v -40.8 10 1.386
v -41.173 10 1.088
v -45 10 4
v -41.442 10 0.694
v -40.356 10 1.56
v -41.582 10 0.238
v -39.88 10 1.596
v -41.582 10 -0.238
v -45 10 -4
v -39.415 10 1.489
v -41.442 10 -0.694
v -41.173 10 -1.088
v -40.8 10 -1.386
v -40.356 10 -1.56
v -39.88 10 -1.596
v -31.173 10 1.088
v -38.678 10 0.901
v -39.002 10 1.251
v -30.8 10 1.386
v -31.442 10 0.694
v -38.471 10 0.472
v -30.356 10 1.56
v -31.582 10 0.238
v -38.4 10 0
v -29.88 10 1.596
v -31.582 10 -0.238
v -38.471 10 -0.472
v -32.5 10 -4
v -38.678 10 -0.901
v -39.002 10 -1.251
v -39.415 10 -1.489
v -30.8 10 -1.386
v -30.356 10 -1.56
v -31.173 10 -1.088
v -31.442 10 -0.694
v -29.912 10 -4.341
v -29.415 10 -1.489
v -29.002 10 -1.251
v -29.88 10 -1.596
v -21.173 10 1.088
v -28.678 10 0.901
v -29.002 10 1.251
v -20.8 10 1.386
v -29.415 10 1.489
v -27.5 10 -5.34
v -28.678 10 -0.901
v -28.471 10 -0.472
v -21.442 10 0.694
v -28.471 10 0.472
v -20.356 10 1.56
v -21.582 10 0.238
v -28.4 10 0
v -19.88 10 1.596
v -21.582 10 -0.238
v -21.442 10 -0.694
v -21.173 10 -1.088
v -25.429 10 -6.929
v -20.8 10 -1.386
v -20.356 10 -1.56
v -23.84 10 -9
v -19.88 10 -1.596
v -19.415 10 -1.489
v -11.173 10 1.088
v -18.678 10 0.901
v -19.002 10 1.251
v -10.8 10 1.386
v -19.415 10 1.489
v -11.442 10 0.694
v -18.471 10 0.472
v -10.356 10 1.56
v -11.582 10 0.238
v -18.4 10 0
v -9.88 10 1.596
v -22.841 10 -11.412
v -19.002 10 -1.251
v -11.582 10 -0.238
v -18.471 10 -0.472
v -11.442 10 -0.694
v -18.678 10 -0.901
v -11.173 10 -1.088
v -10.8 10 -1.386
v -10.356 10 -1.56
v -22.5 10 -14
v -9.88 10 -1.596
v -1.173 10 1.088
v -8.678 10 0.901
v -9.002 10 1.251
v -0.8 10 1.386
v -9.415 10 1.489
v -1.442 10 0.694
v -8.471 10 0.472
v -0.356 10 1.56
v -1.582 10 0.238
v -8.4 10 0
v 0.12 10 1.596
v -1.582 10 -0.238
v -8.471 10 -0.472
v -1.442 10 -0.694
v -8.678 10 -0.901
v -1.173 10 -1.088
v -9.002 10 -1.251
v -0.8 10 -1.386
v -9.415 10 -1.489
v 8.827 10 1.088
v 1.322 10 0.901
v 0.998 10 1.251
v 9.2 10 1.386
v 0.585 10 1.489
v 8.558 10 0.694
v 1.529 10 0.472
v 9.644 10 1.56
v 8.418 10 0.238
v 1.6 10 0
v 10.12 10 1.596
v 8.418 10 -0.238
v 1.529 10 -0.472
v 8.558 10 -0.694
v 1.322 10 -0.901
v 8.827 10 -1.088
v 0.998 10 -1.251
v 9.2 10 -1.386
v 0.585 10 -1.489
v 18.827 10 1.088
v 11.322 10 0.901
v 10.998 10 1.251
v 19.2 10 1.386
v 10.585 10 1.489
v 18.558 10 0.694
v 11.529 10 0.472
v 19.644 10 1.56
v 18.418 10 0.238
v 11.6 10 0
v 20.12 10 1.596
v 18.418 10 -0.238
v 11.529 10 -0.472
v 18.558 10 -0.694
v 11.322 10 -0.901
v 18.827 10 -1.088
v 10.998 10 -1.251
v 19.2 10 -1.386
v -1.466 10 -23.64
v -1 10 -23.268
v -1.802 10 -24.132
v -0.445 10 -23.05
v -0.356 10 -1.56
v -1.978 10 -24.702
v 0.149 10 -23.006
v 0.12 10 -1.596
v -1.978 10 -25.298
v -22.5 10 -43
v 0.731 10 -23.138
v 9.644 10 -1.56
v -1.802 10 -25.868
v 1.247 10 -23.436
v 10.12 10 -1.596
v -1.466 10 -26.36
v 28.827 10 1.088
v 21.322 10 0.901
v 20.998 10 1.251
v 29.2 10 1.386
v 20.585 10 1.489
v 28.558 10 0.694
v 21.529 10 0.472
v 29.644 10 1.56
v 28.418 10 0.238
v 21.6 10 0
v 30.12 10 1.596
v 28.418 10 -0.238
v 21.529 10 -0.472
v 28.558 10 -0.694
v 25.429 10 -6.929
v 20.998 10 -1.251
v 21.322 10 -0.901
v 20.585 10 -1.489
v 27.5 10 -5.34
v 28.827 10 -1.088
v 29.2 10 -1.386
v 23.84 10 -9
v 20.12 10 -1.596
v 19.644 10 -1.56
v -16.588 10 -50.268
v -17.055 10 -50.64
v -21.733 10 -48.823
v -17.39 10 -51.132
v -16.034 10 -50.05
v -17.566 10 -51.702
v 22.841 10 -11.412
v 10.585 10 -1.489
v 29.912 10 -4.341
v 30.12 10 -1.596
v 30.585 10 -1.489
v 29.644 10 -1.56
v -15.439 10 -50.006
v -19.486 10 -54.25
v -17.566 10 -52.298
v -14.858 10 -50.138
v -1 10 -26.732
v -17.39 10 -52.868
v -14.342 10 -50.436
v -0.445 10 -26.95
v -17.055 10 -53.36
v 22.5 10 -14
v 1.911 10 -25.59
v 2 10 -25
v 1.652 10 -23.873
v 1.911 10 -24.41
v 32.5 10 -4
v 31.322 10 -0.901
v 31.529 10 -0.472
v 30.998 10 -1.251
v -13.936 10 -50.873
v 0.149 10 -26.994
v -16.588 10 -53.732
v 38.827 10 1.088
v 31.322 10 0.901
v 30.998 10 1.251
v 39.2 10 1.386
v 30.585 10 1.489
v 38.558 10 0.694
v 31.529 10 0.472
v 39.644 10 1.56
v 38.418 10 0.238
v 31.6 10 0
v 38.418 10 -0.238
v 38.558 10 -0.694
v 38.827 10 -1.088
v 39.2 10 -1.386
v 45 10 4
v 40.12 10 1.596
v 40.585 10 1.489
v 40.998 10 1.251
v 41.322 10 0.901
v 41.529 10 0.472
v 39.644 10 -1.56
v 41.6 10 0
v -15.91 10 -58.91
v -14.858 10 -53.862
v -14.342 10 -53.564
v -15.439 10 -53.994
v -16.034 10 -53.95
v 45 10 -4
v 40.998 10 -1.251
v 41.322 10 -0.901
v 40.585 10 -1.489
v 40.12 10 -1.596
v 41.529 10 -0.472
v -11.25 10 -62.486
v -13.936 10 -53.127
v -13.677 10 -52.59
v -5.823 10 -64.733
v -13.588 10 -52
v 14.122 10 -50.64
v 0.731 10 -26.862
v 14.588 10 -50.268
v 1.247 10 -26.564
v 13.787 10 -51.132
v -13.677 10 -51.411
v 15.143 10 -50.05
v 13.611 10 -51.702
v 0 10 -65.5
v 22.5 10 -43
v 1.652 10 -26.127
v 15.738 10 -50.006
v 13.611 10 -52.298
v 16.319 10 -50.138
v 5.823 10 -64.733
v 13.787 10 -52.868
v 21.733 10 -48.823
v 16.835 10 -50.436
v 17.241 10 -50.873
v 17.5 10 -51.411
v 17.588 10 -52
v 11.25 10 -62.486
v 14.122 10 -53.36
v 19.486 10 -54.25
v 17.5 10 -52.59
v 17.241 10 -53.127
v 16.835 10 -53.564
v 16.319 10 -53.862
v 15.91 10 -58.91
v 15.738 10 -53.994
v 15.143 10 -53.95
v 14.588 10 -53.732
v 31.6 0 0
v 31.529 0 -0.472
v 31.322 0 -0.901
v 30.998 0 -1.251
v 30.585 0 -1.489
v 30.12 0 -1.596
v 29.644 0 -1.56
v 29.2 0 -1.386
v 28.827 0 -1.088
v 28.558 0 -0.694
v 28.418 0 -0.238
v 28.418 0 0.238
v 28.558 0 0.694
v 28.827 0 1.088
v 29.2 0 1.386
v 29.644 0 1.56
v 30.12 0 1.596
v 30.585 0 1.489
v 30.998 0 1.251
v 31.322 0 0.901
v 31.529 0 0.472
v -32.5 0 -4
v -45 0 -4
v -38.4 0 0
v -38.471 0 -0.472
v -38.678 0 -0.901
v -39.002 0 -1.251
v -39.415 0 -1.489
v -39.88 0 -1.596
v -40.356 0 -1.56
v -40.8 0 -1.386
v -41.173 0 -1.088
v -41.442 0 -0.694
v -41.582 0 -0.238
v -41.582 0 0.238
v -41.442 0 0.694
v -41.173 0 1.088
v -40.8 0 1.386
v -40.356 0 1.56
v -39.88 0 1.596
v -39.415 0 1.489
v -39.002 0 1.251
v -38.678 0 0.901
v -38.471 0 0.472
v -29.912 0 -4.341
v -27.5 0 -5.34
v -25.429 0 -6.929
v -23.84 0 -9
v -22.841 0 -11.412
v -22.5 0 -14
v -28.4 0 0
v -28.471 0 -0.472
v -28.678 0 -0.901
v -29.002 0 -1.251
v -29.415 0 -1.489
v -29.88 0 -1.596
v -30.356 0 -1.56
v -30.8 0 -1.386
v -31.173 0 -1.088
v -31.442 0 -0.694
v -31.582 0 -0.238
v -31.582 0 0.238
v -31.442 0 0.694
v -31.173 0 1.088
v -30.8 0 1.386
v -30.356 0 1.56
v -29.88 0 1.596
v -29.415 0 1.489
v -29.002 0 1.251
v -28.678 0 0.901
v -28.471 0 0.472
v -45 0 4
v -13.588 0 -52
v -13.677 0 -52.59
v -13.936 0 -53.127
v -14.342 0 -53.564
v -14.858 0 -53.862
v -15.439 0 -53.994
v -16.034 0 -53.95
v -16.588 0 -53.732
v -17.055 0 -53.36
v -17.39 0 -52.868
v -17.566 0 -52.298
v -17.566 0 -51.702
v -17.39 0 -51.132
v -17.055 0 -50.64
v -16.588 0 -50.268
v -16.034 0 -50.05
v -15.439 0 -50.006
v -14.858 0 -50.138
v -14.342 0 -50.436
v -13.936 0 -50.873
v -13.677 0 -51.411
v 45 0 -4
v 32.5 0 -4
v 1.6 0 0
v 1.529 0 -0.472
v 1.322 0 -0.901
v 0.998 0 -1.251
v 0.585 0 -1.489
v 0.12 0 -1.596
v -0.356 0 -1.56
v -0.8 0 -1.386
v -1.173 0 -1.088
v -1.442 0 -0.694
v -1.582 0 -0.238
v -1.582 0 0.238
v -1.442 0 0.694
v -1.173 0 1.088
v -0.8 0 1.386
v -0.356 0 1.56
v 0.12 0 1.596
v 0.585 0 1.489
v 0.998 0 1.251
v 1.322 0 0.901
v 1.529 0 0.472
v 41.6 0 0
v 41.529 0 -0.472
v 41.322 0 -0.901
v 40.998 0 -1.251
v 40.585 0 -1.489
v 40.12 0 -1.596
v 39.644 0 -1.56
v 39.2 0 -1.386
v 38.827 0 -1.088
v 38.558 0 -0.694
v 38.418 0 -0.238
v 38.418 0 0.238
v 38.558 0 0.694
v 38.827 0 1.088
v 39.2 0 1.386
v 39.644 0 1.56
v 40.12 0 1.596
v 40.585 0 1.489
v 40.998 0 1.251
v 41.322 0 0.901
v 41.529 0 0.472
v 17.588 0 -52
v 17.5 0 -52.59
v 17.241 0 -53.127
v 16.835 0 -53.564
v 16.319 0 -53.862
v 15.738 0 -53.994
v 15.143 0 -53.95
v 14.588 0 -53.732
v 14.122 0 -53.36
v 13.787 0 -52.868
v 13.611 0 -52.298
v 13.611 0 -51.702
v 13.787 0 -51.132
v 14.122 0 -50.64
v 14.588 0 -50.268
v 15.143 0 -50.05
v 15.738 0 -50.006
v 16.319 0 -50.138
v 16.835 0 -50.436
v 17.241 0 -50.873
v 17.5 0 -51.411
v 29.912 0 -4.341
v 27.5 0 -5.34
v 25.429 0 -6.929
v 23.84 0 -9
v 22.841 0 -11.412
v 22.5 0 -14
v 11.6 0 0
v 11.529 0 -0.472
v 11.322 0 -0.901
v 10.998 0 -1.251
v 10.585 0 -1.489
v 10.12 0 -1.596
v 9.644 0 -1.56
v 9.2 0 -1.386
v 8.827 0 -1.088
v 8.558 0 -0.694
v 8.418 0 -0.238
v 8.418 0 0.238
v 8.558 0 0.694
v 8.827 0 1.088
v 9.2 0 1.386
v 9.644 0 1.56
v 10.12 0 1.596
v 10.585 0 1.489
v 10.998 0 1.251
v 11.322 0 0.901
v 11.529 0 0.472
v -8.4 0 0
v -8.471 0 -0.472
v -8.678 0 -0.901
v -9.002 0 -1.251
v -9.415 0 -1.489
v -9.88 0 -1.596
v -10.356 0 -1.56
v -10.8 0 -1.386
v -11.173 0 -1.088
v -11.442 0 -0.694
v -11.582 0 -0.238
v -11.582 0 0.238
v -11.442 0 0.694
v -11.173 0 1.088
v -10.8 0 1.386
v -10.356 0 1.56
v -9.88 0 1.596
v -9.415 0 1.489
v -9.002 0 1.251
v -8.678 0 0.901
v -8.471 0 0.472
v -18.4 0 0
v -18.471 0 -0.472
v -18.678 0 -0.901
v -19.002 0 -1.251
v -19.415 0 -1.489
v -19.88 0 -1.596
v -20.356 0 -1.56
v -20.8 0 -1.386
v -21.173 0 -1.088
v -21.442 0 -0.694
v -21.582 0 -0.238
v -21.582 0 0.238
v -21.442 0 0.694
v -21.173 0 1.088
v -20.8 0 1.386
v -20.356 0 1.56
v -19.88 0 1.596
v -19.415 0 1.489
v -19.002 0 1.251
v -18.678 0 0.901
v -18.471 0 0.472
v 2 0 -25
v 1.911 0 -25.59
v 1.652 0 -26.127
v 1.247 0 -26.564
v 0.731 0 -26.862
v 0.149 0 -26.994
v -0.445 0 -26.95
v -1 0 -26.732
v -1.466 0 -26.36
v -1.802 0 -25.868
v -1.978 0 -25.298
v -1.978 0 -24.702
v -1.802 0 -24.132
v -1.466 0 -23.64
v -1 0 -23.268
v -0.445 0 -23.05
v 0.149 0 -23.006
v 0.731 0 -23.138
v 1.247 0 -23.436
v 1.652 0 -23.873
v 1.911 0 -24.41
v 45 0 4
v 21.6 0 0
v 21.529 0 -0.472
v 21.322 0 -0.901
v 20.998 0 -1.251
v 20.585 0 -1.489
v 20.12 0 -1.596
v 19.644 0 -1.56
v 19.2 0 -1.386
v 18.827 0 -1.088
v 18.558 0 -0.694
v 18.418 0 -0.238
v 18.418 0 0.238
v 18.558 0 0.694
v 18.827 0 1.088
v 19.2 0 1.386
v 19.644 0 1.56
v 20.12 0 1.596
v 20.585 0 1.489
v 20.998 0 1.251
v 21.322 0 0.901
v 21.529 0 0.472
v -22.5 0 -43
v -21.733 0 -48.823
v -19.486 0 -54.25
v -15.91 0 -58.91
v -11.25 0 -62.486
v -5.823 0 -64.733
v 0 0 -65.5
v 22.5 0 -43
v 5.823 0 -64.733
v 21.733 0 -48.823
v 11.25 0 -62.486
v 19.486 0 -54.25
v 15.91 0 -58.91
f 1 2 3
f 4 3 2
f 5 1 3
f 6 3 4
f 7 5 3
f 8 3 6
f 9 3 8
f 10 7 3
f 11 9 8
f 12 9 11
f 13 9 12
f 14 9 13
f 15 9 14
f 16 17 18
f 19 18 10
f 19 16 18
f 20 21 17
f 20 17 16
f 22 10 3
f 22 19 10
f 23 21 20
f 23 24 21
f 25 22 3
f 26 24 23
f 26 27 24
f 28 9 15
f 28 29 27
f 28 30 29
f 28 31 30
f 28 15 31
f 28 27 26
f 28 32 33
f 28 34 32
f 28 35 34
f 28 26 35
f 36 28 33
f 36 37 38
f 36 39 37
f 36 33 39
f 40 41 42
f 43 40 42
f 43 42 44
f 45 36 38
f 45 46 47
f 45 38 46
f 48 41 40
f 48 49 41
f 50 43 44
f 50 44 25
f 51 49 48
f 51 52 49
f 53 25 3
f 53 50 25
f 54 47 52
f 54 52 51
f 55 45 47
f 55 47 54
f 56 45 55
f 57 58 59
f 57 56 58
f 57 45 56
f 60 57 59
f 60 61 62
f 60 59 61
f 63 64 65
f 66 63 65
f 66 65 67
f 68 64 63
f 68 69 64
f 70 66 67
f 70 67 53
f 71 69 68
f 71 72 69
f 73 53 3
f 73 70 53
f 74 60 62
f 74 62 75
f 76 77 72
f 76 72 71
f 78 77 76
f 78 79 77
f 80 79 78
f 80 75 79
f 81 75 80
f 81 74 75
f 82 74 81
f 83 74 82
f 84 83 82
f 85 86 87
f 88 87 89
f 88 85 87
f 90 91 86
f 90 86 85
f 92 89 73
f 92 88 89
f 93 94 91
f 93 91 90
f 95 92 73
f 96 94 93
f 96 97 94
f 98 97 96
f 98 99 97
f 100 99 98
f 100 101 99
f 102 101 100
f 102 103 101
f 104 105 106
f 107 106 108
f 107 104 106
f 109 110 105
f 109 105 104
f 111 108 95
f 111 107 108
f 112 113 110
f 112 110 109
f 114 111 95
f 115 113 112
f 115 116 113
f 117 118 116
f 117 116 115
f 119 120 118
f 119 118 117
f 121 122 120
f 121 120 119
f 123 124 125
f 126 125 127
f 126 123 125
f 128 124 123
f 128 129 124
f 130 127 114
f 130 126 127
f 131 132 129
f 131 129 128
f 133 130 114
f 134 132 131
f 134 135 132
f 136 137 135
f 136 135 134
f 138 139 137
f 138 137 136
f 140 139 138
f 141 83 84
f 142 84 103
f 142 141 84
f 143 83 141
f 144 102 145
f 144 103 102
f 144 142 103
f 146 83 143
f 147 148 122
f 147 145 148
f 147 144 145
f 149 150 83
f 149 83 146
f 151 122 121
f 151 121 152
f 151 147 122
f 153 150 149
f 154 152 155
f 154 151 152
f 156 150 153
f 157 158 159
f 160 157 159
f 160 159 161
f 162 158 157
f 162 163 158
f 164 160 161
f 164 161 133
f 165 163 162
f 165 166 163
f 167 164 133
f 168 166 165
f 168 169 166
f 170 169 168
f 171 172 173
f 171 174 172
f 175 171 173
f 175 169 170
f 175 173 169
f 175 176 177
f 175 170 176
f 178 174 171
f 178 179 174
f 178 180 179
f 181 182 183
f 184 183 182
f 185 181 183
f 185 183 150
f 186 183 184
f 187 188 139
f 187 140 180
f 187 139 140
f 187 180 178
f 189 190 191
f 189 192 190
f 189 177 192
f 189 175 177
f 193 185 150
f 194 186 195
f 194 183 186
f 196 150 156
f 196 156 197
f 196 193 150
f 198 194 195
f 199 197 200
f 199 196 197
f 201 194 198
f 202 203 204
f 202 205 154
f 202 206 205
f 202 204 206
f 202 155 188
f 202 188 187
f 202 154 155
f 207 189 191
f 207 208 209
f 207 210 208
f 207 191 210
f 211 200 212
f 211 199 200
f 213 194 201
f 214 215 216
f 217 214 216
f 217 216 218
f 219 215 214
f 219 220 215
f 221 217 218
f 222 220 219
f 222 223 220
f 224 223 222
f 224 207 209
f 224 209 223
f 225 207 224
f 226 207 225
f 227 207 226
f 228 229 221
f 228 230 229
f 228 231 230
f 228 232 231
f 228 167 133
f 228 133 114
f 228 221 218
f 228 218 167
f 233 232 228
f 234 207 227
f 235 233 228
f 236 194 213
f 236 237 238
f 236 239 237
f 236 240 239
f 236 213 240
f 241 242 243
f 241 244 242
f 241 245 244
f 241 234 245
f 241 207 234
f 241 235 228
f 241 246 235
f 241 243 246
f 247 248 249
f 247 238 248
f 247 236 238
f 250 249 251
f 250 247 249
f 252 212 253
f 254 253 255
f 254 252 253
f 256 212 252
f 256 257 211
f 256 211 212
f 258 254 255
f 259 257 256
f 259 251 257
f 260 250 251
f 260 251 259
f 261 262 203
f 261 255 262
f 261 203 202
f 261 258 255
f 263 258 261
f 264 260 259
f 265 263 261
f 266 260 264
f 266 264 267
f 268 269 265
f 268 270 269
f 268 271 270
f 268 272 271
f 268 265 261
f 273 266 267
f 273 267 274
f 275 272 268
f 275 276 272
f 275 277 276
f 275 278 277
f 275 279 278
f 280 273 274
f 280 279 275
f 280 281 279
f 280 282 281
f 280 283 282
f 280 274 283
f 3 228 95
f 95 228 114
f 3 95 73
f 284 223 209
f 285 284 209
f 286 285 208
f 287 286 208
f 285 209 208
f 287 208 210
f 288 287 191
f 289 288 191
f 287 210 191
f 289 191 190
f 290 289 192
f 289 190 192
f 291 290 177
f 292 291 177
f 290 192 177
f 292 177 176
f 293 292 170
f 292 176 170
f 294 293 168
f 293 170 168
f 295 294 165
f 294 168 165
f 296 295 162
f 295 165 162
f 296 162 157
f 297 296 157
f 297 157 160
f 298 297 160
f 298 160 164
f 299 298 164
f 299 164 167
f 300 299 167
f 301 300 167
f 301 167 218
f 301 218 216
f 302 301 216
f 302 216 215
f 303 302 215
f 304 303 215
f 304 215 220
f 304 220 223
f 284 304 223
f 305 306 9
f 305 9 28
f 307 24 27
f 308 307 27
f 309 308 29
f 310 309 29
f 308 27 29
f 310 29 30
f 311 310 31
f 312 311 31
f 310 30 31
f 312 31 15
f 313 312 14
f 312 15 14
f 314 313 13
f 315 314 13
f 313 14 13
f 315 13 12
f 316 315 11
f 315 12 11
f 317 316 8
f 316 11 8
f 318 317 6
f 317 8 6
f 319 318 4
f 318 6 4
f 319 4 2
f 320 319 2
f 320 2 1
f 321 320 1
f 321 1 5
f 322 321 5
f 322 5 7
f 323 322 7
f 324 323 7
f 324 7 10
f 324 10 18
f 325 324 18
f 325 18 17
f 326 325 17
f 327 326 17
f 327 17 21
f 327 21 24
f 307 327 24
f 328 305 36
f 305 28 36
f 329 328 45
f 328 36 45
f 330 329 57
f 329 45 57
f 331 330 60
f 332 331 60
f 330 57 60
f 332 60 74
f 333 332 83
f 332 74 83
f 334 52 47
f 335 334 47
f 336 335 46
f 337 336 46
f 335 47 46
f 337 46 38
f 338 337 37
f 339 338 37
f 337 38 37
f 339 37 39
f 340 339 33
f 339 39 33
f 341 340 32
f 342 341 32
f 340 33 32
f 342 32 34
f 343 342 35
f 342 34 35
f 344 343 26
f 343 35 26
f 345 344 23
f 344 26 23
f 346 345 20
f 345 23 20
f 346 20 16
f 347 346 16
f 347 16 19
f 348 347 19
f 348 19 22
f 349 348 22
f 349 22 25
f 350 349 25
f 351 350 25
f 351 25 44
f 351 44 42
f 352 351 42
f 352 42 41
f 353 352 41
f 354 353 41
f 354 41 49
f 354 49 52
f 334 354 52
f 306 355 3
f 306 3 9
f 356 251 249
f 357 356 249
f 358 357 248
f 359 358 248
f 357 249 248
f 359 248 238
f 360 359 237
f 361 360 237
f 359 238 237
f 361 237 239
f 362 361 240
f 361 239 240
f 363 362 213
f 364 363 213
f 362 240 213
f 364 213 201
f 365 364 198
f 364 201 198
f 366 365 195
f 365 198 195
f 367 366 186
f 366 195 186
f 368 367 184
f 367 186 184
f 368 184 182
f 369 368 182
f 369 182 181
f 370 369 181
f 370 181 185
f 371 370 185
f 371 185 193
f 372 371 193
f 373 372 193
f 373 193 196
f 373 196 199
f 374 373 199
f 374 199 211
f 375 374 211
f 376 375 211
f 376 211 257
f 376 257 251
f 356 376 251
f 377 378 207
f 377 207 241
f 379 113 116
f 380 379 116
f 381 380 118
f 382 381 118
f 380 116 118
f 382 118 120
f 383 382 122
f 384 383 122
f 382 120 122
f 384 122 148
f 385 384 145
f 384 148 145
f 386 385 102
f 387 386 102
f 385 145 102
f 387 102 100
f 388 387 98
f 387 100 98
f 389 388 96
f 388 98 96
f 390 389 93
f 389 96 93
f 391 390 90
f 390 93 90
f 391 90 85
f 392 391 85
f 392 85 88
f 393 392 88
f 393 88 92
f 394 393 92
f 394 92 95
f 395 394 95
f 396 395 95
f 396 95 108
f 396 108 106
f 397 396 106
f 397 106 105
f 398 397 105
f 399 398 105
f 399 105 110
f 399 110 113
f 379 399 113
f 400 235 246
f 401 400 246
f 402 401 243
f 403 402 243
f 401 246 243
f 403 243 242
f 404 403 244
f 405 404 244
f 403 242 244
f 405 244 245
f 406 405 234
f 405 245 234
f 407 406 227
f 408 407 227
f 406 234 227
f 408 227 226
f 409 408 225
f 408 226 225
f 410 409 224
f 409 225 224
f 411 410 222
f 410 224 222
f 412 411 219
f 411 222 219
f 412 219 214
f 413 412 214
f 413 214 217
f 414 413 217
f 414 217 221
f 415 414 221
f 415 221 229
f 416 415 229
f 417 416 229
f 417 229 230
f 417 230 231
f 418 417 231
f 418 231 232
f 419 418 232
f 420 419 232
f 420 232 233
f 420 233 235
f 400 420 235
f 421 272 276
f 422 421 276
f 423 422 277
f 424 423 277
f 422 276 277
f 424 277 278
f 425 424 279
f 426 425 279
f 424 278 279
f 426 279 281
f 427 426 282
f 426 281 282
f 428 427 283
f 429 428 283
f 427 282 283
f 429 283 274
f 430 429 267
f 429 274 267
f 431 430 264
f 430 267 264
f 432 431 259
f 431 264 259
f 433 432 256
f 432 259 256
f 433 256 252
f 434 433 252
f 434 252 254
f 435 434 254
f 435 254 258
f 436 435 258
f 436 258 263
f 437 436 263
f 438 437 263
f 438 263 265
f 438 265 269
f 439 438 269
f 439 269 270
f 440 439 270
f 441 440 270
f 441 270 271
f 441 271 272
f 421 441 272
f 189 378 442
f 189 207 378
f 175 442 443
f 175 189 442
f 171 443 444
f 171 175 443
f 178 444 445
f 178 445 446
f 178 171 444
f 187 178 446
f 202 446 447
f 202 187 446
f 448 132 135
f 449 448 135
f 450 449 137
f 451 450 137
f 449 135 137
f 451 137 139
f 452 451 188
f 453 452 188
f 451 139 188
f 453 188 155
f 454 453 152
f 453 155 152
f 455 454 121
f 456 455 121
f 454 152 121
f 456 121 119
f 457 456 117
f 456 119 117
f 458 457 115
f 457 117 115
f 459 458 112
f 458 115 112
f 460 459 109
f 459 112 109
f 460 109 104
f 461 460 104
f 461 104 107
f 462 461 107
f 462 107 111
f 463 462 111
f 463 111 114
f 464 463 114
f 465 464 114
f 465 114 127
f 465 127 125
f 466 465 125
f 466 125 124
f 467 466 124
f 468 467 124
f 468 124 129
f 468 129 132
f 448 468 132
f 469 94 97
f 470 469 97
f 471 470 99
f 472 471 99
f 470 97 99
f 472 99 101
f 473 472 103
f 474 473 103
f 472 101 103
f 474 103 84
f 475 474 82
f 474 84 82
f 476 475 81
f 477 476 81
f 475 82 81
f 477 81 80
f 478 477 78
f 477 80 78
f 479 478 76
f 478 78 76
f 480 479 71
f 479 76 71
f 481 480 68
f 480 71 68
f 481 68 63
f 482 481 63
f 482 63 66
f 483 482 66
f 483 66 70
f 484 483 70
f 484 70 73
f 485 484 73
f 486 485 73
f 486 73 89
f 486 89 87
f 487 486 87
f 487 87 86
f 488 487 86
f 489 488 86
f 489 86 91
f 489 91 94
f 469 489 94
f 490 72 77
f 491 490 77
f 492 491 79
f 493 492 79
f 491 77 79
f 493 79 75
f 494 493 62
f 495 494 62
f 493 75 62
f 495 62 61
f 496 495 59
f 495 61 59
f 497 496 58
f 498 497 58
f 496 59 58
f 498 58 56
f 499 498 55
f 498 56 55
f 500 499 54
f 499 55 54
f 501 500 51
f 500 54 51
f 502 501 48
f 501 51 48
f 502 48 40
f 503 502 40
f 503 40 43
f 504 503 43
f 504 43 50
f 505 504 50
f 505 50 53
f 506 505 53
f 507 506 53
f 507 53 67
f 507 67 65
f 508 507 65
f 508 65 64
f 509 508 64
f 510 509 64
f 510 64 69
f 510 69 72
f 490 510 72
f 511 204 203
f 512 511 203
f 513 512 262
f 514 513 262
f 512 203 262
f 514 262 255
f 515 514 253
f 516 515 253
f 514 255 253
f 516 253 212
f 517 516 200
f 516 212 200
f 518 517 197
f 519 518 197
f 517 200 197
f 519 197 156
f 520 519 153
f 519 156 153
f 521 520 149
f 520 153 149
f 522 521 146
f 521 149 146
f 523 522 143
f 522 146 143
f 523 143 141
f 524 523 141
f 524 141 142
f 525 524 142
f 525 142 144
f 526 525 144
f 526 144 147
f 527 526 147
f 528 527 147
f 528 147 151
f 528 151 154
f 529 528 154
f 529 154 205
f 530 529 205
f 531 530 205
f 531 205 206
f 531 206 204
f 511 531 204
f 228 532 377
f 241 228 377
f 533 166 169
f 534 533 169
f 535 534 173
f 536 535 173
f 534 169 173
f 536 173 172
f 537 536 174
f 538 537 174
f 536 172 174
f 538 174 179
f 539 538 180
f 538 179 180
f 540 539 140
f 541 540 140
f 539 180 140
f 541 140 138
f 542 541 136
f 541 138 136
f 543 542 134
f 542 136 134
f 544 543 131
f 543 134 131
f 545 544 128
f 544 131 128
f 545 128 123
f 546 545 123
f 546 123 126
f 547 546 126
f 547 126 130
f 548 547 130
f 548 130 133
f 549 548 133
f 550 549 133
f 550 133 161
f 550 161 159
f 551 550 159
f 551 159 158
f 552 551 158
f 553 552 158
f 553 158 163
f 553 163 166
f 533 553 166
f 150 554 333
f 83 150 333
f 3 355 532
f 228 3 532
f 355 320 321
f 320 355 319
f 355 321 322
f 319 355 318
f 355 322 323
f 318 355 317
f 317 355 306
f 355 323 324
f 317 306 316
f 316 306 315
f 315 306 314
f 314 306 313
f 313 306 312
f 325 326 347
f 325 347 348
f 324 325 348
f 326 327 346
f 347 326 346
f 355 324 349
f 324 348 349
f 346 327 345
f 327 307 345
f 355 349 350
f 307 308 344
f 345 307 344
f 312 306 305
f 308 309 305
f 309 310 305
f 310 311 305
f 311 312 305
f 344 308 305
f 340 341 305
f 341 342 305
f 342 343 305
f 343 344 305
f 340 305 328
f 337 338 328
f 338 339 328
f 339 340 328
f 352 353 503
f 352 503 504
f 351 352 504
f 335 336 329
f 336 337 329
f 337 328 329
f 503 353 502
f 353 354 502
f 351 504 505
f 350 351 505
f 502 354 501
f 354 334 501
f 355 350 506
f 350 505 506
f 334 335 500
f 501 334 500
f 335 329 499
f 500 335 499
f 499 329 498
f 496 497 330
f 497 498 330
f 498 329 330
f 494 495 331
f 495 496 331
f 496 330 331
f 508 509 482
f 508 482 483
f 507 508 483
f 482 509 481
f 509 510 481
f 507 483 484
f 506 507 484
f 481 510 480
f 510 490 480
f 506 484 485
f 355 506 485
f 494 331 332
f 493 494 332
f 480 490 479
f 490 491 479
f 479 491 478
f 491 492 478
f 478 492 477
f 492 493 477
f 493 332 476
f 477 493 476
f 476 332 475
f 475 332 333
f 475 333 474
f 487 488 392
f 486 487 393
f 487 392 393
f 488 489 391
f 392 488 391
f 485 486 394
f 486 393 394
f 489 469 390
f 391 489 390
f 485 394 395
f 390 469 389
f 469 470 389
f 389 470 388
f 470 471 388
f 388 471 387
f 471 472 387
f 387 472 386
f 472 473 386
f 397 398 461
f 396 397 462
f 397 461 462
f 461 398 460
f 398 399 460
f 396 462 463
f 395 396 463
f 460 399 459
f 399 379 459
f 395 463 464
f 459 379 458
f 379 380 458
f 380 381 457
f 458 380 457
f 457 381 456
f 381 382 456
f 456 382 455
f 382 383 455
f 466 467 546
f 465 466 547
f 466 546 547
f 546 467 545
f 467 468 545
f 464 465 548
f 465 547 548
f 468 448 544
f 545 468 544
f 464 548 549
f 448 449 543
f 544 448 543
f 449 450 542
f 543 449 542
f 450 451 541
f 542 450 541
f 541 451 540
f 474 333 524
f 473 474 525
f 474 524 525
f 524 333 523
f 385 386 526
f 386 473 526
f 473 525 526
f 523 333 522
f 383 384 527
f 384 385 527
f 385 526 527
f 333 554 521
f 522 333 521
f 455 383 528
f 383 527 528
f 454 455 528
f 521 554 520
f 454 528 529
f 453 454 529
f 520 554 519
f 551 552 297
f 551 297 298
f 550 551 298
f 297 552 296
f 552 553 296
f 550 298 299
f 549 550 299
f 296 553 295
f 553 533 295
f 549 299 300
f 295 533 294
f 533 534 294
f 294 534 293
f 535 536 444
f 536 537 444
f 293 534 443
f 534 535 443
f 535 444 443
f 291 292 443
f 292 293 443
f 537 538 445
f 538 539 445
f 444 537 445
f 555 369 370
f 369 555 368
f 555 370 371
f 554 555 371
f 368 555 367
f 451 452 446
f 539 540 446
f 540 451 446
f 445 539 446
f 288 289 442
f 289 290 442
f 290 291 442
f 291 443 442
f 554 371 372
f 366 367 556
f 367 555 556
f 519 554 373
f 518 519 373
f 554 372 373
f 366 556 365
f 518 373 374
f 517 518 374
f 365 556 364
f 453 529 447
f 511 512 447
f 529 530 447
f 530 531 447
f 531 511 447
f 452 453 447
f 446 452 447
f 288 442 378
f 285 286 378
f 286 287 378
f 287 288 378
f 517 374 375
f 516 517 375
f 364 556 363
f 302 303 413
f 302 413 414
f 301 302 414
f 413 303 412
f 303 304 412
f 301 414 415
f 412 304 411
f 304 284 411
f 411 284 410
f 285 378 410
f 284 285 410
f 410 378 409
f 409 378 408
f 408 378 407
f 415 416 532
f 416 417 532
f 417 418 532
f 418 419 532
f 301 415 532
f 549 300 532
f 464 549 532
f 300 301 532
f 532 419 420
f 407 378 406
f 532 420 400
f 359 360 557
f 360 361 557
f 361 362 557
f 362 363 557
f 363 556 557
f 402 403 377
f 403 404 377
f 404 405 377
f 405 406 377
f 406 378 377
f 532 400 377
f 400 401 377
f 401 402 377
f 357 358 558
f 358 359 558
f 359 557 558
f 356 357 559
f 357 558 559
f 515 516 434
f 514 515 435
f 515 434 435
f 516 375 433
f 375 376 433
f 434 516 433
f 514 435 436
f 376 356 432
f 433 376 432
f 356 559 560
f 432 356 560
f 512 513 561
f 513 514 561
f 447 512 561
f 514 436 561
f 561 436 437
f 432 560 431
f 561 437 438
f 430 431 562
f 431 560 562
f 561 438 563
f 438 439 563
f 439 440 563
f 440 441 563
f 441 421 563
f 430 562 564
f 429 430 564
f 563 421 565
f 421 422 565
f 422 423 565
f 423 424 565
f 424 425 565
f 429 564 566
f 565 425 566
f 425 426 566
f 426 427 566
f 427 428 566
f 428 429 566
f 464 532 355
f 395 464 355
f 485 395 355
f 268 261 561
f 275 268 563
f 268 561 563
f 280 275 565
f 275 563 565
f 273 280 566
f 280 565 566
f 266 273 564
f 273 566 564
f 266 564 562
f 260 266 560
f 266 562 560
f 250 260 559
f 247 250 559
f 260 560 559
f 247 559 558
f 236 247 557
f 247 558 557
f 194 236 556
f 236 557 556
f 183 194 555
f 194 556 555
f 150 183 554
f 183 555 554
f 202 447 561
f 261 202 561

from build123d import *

# Parameters (mm, degrees)
SKETCH1_W           = 90
SKETCH1_H           = 8
BOSS_EXTRUDE1_DEPTH = 10
BOSS_EXTRUDE2_DEPTH = 10
SKETCH4_R           = 2
CUT_EXTRUDE1_DEPTH  = 11
FILLET1_R           = 10
SKETCH5_R           = 1.6
CUT_EXTRUDE2_DEPTH  = 11
LPATTERN1_COUNT     = 10
LPATTERN1_PITCH     = 10


with BuildPart() as part:
    # Sketch1 → Boss-Extrude1 (new body)
    with BuildSketch(Plane(origin=(0, 0, 0), x_dir=(1, 0, 0), z_dir=(0, 1, 0))):
        Rectangle(SKETCH1_W, SKETCH1_H)
    extrude(amount=BOSS_EXTRUDE1_DEPTH)

    # Sketch3 → Boss-Extrude2 (add)
    with BuildSketch(Plane(origin=(0, 0, 0), x_dir=(1, 0, 0), z_dir=(0, 1, 0))):
        with BuildLine():
            Line((-22.5, 43.000049343), (-22.5, 4))
            Line((-22.5, 4), (22.5, 4))
            Line((22.5, 4), (22.5, 43.000049343))
            ThreePointArc((22.5, 43.000049343), (0, 65.500049343), (-22.5, 43.000049343))
        make_face()
    extrude(amount=BOSS_EXTRUDE2_DEPTH)

    # Sketch4 → Cut-Extrude1 (cut, through all)
    with BuildSketch(Plane(origin=(0, 10, 0), x_dir=(1, 0, 0), z_dir=(0, 1, 0))):
        with Locations((-15.5885, 52.000074014)):
            Circle(SKETCH4_R)
        with Locations((15.5885, 52.000074014)):
            Circle(SKETCH4_R)
        with Locations((0, 25)):
            Circle(SKETCH4_R)
    extrude(amount=-CUT_EXTRUDE1_DEPTH, mode=Mode.SUBTRACT)

    # Fillet1
    fillet1_edges = [part.edges().sort_by_distance(p)[0] for p in [
        (22.5, 5, -4),
        (-22.5, 5, -4),
    ]]
    fillet(fillet1_edges, radius=FILLET1_R)

    # Sketch5 → Cut-Extrude2 (cut, through all)
    with BuildSketch(Plane(origin=(0, 10, 0), x_dir=(1, 0, 0), z_dir=(0, 1, 0))):
        with Locations((-40, 0)):
            Circle(SKETCH5_R)
    cut_extrude2 = extrude(amount=-CUT_EXTRUDE2_DEPTH, mode=Mode.SUBTRACT)

    # LPattern1: Cut-Extrude2 ×10
    with Locations(*[(i * LPATTERN1_PITCH, 0, 0) for i in range(1, LPATTERN1_COUNT)]):
        add(cut_extrude2, mode=Mode.SUBTRACT)


solid = part.part
